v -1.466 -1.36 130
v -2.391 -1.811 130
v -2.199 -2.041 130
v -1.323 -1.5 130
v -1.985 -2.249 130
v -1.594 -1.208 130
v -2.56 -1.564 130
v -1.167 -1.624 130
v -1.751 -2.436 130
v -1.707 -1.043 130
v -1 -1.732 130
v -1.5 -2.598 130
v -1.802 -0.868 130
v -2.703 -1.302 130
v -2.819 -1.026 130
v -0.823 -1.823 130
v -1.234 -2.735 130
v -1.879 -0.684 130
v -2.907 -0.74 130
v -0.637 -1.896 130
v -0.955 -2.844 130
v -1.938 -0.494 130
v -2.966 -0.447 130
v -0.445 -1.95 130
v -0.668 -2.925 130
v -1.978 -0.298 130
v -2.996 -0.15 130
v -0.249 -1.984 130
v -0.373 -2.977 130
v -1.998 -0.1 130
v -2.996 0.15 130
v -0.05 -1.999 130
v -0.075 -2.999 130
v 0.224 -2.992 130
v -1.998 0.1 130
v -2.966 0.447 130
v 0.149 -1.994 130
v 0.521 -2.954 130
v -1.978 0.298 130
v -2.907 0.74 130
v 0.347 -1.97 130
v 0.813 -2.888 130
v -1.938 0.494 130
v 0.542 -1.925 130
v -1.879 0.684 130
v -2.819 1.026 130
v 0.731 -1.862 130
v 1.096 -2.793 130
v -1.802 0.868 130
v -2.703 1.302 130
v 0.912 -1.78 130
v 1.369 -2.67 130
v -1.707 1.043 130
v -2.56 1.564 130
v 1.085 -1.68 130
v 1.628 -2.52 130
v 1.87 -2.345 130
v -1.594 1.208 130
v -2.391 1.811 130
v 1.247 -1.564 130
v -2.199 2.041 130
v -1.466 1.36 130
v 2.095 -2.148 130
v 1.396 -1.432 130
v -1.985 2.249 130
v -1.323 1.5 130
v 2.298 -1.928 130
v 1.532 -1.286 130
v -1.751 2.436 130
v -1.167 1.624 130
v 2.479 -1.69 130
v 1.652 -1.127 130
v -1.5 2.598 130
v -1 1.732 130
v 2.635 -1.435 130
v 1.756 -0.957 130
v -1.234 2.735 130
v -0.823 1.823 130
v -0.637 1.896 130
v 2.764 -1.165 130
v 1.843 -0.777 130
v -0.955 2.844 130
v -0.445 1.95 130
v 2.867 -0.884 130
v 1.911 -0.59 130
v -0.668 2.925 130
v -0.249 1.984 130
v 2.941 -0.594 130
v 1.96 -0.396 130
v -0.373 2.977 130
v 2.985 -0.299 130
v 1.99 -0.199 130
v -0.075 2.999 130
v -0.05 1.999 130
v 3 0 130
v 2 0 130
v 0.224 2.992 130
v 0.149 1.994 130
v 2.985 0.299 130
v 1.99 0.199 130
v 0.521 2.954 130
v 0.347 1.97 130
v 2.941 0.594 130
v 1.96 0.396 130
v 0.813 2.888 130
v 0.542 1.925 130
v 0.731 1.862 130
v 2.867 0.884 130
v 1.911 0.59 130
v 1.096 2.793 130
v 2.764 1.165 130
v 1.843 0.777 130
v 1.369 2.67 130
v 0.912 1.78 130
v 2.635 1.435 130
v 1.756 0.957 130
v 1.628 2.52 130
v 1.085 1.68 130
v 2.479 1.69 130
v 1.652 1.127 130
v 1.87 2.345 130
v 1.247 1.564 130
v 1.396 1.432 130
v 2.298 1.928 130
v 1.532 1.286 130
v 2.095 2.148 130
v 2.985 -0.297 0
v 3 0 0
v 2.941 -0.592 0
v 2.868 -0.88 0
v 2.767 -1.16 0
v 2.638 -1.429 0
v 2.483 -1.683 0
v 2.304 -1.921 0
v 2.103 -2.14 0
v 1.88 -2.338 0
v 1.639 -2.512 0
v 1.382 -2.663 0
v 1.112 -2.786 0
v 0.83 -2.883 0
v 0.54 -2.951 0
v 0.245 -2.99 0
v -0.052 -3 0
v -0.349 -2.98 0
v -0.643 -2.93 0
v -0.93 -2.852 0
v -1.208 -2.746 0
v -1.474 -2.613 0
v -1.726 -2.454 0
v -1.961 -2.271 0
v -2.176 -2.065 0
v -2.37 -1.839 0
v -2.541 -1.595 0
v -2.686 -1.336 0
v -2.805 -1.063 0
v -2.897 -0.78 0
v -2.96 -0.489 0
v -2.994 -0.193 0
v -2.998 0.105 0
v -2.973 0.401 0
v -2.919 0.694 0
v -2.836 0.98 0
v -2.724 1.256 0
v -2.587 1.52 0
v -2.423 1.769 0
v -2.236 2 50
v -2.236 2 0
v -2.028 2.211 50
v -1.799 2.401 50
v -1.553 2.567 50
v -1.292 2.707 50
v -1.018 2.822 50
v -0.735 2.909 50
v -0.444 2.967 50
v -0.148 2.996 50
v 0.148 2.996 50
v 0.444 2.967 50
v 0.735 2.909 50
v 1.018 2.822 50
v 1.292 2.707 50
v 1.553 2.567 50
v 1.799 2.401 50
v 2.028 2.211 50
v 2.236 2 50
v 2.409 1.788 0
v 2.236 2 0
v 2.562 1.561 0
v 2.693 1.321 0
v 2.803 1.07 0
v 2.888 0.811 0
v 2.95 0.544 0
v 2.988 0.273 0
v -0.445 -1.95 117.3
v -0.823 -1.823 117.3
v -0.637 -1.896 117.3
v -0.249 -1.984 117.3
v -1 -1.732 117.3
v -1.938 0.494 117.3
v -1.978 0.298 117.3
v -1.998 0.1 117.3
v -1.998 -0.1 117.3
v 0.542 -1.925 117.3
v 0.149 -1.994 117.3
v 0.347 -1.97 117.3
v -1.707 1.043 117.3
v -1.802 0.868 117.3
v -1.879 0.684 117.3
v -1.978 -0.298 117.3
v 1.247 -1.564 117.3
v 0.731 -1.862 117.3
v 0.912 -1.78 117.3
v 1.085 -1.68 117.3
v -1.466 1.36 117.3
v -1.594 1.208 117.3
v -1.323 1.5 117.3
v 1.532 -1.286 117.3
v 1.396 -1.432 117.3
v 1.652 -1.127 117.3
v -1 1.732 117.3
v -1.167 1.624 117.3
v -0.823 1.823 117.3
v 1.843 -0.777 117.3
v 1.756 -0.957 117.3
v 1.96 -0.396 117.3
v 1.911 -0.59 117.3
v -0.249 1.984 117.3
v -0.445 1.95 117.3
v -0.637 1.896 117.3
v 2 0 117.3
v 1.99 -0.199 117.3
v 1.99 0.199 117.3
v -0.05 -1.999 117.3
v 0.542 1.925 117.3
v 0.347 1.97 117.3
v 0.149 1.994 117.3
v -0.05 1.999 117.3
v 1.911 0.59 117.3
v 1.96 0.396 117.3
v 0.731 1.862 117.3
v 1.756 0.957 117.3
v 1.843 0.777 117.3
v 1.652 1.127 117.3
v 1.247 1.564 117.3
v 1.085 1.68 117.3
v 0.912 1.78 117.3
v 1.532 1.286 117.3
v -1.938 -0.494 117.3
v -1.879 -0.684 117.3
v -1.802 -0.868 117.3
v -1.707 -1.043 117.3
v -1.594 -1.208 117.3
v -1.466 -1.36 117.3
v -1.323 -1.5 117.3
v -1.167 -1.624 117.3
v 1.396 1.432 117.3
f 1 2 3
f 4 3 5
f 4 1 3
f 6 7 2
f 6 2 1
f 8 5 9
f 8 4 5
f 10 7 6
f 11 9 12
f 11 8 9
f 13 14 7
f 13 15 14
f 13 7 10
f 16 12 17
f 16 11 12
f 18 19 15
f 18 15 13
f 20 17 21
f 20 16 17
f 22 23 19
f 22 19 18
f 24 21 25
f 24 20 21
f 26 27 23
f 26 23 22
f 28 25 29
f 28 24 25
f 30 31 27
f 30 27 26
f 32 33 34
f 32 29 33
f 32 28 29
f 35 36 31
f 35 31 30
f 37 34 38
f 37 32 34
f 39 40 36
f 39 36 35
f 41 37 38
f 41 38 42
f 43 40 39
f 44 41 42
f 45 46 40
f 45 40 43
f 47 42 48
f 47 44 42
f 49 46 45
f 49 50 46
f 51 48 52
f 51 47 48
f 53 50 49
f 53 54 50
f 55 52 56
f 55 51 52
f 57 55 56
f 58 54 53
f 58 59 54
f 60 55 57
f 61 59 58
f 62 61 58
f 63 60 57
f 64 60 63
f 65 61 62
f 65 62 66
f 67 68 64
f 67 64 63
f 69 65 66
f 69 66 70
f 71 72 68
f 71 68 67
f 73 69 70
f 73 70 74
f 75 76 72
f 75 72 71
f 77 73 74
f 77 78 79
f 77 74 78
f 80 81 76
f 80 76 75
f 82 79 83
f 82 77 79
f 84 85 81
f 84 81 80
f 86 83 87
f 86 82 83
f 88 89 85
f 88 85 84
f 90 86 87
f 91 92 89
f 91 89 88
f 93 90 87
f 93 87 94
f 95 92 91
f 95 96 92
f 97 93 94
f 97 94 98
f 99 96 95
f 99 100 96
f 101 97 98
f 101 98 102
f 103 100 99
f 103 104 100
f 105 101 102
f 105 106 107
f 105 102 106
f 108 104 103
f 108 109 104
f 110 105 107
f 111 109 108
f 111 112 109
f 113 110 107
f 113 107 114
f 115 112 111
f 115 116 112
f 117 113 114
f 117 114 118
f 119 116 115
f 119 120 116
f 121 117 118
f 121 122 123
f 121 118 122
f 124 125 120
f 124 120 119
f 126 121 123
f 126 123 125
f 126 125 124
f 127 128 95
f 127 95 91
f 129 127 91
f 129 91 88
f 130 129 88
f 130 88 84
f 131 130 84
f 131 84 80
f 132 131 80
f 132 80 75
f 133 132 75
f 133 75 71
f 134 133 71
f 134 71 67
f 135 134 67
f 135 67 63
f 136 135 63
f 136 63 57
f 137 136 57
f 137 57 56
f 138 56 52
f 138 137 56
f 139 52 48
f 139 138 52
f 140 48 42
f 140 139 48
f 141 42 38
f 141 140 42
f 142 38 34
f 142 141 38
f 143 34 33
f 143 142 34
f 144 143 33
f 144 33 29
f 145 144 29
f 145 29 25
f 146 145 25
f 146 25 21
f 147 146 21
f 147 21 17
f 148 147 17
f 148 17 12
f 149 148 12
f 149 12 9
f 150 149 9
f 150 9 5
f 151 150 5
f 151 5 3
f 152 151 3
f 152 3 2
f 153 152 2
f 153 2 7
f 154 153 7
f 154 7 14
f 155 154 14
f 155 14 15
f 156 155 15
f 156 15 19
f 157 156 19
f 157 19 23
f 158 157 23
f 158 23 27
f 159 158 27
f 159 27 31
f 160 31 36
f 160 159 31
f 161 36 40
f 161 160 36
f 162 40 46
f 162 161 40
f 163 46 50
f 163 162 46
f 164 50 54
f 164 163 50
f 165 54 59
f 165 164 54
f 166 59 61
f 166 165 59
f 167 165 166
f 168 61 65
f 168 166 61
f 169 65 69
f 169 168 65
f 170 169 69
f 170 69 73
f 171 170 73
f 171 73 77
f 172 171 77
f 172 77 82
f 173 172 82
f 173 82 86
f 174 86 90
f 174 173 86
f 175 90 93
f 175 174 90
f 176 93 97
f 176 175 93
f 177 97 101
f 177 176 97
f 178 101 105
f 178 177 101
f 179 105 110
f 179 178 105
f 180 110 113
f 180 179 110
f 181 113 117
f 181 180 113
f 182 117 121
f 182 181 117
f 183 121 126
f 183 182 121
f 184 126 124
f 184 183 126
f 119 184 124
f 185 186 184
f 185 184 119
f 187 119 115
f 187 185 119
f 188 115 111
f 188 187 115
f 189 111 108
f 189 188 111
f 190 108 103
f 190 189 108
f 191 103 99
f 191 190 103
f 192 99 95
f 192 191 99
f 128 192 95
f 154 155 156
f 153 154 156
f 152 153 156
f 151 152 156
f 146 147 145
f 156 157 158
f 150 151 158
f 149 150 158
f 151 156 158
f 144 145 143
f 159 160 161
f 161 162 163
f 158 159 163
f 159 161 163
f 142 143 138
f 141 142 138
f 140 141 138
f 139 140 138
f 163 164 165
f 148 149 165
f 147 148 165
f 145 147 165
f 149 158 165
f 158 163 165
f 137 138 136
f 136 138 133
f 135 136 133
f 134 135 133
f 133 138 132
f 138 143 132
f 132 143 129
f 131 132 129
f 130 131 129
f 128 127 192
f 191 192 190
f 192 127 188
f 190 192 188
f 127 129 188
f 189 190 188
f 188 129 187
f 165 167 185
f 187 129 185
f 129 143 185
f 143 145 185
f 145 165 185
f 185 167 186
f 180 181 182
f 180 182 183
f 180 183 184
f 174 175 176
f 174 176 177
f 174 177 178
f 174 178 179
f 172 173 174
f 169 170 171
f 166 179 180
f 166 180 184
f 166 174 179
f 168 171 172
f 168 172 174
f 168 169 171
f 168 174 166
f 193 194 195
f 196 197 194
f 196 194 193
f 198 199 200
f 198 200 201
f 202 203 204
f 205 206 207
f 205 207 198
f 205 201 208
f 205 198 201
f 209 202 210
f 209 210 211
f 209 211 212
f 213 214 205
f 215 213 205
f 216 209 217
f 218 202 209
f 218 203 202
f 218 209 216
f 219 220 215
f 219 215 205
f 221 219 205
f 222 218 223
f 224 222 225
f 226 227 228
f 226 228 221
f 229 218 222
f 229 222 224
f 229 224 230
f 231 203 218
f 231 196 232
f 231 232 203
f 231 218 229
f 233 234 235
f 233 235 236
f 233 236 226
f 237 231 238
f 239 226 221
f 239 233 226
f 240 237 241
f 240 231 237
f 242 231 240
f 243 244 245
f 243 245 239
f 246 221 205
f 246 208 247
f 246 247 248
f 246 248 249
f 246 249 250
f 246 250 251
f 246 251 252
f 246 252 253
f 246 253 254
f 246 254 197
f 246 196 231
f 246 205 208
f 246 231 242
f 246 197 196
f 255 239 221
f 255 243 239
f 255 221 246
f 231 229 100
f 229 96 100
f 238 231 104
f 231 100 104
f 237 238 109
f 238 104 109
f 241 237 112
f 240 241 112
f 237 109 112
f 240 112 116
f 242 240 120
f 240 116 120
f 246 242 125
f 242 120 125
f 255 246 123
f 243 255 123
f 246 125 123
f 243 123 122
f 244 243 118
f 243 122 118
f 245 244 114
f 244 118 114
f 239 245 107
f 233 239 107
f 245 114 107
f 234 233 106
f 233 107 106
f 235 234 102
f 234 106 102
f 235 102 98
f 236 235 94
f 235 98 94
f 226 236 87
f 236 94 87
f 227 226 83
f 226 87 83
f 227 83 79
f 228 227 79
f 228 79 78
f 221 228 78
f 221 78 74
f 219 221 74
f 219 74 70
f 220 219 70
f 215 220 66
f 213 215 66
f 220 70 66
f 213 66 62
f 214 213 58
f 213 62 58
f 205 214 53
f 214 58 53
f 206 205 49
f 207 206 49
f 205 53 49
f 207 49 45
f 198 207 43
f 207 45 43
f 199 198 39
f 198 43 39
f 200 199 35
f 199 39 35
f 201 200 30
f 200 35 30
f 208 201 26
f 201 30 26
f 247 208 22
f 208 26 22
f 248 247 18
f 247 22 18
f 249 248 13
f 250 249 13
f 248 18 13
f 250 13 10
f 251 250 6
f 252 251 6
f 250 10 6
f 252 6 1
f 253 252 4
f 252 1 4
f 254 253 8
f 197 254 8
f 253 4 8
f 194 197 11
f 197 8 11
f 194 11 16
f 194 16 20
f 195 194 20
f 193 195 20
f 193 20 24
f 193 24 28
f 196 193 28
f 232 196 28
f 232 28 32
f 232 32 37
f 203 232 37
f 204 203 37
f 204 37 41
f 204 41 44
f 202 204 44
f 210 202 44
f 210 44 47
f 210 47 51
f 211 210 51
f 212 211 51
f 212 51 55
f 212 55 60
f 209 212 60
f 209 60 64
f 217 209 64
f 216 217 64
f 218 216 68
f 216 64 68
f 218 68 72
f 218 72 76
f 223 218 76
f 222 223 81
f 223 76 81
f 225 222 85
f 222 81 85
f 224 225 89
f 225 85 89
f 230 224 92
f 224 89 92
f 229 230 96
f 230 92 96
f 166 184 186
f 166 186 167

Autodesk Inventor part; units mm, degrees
ref_plane "YZ Plane" through (0, 0, 0) normal (1, 0, 0) x (0, 1, 0)
ref_plane "XZ Plane" through (0, 0, 0) normal (0, 1, 0) x (-1, 0, 0)
ref_plane "XY Plane" through (0, 0, 0) normal (0, 0, 1) x (1, 0, 0)
sketch "Sketch1" plane through (0, 0, 0) normal (0, 0, 1) x (1, 0, 0)
  circle A0 centre (0, 0) radius 3
  line L0 (-2.2361, 2) -> (2.2361, 2)
  arc A1 (-2.2361, 2) -> (2.2361, 2) centre (0, 0) ccw
  dimension "d0" = 6
  dimension "d1" = 2
extrude "Extrusion1" add sketch "Sketch1" along normal blind 130
sketch "Sketch3" plane through (0, 0, 130) normal (0, 0, 1) x (1, 0, 0)
  circle A0 centre (0, 0) radius 2
  dimension "d22" = 4
extrude "Extrusion3" cut sketch "Sketch3" against normal blind 12.7
sketch "Sketch4" plane through (0, 0, 0) normal (0, 0, -1) x (-1, 0, 0)
  circle A0 centre (0, 0) radius 3 projected
  line L0 (-2.2361, 2) -> (2.2361, 2)
  arc A1 (-2.2361, 2) -> (2.2361, 2) centre (0, 0) ccw
  dimension "d25" = 2
extrude "Extrusion4" cut sketch "Sketch4" against normal blind 50 contours L0 A0 picked at (-0.5653, 2.1582)
properties part number "6mm x 160mm D Shaft" material "Stainless Steel"
